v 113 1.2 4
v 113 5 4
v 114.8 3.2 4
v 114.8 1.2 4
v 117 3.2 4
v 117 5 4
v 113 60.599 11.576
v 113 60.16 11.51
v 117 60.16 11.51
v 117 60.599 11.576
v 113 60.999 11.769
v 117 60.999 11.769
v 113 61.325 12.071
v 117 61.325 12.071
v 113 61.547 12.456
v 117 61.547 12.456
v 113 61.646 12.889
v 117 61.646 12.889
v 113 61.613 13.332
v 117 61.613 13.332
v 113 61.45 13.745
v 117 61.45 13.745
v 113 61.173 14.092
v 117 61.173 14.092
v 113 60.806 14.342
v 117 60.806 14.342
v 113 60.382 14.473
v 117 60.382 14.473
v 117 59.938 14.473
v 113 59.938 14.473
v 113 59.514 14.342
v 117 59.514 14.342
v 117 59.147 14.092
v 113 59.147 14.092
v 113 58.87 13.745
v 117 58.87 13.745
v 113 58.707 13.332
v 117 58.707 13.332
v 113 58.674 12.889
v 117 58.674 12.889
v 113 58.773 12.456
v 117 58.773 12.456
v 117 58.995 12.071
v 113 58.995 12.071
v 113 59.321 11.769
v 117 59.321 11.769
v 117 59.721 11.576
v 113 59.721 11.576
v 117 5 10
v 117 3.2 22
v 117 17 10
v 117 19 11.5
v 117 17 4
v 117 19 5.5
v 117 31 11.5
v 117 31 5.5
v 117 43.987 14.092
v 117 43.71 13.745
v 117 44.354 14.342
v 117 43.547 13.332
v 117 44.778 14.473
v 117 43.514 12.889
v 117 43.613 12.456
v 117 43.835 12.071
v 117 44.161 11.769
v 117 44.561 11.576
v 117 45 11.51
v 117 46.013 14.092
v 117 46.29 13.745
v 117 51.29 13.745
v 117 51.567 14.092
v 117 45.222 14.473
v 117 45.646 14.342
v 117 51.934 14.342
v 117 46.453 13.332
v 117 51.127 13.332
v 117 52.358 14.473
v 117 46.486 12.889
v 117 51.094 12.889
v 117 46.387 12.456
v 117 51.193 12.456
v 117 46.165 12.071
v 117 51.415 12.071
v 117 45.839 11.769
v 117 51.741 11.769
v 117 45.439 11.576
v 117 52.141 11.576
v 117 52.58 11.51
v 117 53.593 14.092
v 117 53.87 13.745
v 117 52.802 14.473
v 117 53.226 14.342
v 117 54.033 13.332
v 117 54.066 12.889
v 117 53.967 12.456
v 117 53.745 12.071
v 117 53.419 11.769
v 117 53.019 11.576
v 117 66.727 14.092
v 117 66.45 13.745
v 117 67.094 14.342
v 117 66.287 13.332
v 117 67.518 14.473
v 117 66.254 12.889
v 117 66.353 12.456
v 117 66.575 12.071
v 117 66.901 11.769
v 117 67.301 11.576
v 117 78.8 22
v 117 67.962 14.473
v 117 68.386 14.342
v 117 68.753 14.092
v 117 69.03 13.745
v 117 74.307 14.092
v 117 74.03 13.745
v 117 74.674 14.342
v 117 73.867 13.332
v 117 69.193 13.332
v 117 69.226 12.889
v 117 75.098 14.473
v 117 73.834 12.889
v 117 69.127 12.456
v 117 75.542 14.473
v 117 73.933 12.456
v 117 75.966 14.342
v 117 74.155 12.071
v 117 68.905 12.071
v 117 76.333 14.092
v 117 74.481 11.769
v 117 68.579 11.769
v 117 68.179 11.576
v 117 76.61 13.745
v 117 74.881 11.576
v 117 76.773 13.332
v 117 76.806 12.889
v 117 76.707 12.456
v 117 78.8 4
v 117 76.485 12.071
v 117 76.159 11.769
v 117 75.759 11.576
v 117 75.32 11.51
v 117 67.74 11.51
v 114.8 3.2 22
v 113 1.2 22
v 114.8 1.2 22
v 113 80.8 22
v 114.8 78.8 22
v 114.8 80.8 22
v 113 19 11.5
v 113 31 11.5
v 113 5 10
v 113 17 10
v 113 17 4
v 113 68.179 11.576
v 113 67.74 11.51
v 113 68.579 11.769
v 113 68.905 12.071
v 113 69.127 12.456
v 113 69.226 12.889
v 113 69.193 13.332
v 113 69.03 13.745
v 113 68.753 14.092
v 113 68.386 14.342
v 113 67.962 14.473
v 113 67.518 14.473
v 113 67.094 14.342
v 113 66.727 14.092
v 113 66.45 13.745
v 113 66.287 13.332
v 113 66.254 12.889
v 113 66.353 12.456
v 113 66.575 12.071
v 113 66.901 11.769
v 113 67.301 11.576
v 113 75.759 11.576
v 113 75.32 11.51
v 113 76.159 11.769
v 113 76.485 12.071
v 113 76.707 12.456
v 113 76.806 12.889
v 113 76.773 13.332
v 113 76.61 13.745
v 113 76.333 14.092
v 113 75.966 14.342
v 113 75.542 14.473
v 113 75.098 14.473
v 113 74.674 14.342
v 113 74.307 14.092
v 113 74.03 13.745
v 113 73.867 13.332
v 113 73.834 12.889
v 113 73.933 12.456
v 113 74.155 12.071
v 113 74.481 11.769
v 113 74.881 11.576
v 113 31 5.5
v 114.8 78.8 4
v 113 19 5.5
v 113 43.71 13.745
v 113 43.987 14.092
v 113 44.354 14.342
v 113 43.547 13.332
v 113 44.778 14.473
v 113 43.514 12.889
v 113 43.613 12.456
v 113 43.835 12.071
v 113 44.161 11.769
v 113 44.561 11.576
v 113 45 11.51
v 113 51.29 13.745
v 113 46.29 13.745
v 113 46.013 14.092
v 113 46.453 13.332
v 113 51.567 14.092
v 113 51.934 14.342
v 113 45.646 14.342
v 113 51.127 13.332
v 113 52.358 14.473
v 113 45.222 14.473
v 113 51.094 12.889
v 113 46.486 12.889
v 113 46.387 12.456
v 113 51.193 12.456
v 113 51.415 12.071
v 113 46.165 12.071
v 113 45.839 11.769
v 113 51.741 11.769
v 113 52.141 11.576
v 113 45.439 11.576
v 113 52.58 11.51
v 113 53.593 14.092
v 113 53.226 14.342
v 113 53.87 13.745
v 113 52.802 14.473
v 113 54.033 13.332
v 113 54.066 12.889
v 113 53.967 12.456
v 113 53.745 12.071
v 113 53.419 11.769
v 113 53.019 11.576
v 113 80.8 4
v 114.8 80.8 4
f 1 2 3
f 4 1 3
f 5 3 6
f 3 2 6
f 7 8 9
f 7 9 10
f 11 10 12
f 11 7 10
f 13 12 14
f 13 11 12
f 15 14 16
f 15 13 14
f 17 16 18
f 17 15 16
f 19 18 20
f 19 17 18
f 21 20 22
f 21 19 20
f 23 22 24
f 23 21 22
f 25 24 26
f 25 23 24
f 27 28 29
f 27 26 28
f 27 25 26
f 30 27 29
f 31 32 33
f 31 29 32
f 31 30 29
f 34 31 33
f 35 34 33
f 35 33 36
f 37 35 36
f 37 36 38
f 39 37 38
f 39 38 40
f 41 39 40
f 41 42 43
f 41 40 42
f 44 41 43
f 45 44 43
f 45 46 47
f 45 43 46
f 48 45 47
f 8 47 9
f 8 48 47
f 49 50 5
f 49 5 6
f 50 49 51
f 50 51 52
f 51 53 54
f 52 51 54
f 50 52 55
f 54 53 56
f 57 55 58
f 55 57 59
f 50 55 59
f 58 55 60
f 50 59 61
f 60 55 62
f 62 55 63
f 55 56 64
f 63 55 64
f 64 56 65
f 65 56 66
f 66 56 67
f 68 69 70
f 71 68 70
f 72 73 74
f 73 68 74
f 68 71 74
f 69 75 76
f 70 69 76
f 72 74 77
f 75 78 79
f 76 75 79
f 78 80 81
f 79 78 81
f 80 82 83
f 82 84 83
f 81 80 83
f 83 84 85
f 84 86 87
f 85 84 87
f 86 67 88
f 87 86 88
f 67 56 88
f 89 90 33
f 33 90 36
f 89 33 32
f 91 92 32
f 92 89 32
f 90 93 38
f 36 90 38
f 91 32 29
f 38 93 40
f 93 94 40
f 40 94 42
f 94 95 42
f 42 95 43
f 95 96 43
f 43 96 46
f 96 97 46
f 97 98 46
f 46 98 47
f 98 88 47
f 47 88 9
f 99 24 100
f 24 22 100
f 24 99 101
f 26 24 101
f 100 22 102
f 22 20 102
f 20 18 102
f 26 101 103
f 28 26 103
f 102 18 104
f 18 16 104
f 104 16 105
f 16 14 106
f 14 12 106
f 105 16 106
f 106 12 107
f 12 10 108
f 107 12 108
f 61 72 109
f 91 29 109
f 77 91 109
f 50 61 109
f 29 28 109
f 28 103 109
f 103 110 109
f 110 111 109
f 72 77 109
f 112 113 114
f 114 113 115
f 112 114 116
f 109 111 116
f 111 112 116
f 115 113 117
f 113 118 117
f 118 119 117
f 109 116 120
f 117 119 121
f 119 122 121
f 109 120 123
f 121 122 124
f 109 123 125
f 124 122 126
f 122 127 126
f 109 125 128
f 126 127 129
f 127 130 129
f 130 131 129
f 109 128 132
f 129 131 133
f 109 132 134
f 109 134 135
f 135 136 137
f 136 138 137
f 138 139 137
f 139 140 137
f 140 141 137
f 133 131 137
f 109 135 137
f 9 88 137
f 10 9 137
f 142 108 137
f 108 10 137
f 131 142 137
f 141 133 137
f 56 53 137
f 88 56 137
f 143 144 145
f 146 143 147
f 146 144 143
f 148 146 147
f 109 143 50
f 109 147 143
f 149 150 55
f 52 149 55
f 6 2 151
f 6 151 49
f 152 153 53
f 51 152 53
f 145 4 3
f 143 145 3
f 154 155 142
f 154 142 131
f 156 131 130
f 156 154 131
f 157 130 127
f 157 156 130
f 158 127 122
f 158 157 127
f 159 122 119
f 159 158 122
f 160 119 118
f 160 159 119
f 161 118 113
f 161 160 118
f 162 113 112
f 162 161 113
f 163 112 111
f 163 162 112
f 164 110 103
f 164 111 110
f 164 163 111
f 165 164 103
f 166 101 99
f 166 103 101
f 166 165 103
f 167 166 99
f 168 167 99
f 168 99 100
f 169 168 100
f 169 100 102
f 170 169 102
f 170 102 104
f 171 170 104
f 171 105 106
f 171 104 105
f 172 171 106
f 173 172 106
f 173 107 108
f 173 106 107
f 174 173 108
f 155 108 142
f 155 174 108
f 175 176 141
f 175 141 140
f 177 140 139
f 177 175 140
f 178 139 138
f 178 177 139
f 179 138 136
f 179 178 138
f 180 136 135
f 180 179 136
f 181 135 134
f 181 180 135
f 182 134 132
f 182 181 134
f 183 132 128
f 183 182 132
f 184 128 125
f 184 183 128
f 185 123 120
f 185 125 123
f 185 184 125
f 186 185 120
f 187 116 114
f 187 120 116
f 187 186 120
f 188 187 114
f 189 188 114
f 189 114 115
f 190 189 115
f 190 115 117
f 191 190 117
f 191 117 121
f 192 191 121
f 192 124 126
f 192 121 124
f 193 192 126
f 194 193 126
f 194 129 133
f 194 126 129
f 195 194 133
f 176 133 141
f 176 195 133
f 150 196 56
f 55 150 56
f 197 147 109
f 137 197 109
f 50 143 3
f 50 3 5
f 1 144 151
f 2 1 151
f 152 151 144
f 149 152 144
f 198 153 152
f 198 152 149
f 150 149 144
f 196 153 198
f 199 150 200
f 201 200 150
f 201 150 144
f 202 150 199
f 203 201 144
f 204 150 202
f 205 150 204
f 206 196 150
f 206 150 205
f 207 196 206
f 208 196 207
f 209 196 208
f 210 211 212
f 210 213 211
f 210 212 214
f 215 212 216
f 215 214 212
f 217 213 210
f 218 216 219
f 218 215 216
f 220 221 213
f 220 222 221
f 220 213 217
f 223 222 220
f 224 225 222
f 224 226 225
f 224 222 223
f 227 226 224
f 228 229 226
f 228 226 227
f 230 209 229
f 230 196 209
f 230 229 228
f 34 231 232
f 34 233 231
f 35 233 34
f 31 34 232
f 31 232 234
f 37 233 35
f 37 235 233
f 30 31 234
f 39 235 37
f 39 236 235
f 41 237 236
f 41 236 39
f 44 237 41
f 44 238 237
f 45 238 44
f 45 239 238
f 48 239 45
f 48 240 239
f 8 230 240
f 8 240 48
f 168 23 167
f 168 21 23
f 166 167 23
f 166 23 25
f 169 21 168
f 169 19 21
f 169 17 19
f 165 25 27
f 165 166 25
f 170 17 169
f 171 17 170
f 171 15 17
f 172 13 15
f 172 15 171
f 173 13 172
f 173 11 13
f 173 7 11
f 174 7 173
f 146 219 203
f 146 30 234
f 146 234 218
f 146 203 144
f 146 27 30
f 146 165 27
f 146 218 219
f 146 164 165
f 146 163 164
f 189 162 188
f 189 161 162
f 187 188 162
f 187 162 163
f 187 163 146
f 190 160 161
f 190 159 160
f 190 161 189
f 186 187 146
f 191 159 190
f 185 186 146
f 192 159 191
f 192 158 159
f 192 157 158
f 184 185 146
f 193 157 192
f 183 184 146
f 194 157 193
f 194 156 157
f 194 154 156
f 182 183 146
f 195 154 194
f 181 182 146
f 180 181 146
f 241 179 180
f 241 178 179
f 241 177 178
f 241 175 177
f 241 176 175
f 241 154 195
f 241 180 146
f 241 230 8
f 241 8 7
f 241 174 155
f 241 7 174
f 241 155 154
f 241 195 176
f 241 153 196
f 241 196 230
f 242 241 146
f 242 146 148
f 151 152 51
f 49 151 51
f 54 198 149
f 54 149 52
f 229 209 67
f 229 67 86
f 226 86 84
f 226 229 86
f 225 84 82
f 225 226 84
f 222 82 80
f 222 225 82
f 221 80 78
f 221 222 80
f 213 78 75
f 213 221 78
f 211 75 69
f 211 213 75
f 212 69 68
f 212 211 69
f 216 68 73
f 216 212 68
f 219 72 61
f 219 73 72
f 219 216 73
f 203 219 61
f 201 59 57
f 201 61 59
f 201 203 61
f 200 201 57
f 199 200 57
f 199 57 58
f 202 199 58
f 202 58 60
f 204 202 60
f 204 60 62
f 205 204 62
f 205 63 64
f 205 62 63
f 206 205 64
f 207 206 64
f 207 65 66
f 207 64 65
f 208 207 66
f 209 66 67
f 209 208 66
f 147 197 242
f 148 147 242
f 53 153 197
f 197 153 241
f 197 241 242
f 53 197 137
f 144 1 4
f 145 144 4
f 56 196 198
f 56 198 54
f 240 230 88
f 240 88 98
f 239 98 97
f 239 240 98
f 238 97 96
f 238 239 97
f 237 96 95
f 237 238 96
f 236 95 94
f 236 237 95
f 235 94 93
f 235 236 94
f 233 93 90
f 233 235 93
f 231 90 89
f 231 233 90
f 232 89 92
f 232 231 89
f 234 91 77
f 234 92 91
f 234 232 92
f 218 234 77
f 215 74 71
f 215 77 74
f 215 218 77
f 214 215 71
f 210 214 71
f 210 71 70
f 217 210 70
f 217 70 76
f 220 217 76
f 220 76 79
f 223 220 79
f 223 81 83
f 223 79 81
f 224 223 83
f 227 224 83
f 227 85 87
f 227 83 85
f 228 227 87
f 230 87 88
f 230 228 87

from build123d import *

# Parameters (mm, degrees)
BOX052_W          = 10
BOX052_H          = 12
BOX052_DEPTH      = 6
BOX053_W          = 10
BOX053_H          = 12
BOX053_DEPTH      = 6
CYLINDER011_R     = 1.49
CYLINDER011_DEPTH = 10
ARRAY017_Y_COUNT  = 5
ARRAY017_Y_PITCH  = 7.58
BOX051_W          = 10
BOX051_H          = 10
BOX051_DEPTH      = 31
BOX050_W          = 10
BOX050_H          = 10
BOX050_DEPTH      = 30
BOX049_W          = 10
BOX049_H          = 10
BOX049_DEPTH      = 25
BOX048_W          = 10
BOX048_H          = 10
BOX048_DEPTH      = 25
BOX046_W          = 2
BOX046_H          = 80
BOX046_DEPTH      = 18
BOX047_W          = 4
BOX047_H          = 76
BOX047_DEPTH      = 18


with BuildPart() as usb:
    # Box052 → Box052 (new body)
    with BuildSketch(Plane(origin=(110, 5, 4), x_dir=(1, 0, 0), z_dir=(0, 0, 1))):
        with Locations((5, 6)):
            Rectangle(BOX052_W, BOX052_H)
    extrude(amount=BOX052_DEPTH)


with BuildPart() as jtag:
    # Box053 → Box053 (new body)
    with BuildSketch(Plane(origin=(110, 19, 5.5), x_dir=(1, 0, 0), z_dir=(0, 0, 1))):
        with Locations((5, 6)):
            Rectangle(BOX053_W, BOX053_H)
    extrude(amount=BOX053_DEPTH)


with BuildPart() as fusion008032:
    # Cylinder011 → Cylinder011 (new body)
    with BuildSketch(Plane(origin=(143, 6, 13), x_dir=(0, 0, -1), z_dir=(1, 0, 0))):
        Circle(CYLINDER011_R)
    extrude(amount=CYLINDER011_DEPTH)

    # Array017 Y: Fusion008032 ×5


with BuildPart() as fusion008032_1:
    add(fusion008032.part)
    with Locations(*[(0, i * ARRAY017_Y_PITCH, 0) for i in range(1, ARRAY017_Y_COUNT)]):
        add(fusion008032.part)


with BuildPart() as fusion008032_2:
    # Array017 placement: moved
    add(fusion008032_1.part.moved(Location((-33, 39, 0))))

    # Fusion008032: union USB, JTAG
    add(usb.part)
    add(jtag.part)


with BuildPart() as w_rfel037:
    # Box051 → Box051 (new body)
    with BuildSketch(Plane(origin=(110, 80.8, 0), x_dir=(1, 0, 0), z_dir=(0, 0, 1))):
        with Locations((5, 5)):
            Rectangle(BOX051_W, BOX051_H)
    extrude(amount=BOX051_DEPTH)


with BuildPart() as w_rfel036:
    # Box050 → Box050 (new body)
    with BuildSketch(Plane(origin=(109, -8.8, 0), x_dir=(1, 0, 0), z_dir=(0, 0, 1))):
        with Locations((5, 5)):
            Rectangle(BOX050_W, BOX050_H)
    extrude(amount=BOX050_DEPTH)


with BuildPart() as w_rfel035:
    # Box049 → Box049 (new body)
    with BuildSketch(Plane(origin=(114.8, 78.8, 0), x_dir=(1, 0, 0), z_dir=(0, 0, 1))):
        with Locations((5, 5)):
            Rectangle(BOX049_W, BOX049_H)
    extrude(amount=BOX049_DEPTH)


with BuildPart() as w_rfel034:
    # Box048 → Box048 (new body)
    with BuildSketch(Plane(origin=(114.8, -6.8, 0), x_dir=(1, 0, 0), z_dir=(0, 0, 1))):
        with Locations((5, 5)):
            Rectangle(BOX048_W, BOX048_H)
    extrude(amount=BOX048_DEPTH)


with BuildPart() as f_hrung003:
    # Box046 → Box046 (new body)
    with BuildSketch(Plane(origin=(113, 1, 23), x_dir=(1, 0, 0), z_dir=(0, 0, 1))):
        with Locations((1, 40)):
            Rectangle(BOX046_W, BOX046_H)
    extrude(amount=BOX046_DEPTH)


with BuildPart() as front_cpu:
    # Box047 → Box047 (new body)
    with BuildSketch(Plane(origin=(113, 3, 23), x_dir=(1, 0, 0), z_dir=(0, 0, 1))):
        with Locations((2, 38)):
            Rectangle(BOX047_W, BOX047_H)
    extrude(amount=BOX047_DEPTH)

    # Fusion008031: union Führung003
    add(f_hrung003.part)


with BuildPart() as front_cpu_1:
    # Fusion008031 placement: moved
    add(front_cpu.part.moved(Location((0, 0, -19))))

    # Cut047: cut Würfel034
    add(w_rfel034.part, mode=Mode.SUBTRACT)

    # Cut048: cut Würfel035
    add(w_rfel035.part, mode=Mode.SUBTRACT)

    # Cut049: cut Würfel036
    add(w_rfel036.part, mode=Mode.SUBTRACT)

    # Cut050: cut Würfel037
    add(w_rfel037.part, mode=Mode.SUBTRACT)

    # Cut053: cut Fusion008032
    add(fusion008032_2.part, mode=Mode.SUBTRACT)


solid = front_cpu_1.part
